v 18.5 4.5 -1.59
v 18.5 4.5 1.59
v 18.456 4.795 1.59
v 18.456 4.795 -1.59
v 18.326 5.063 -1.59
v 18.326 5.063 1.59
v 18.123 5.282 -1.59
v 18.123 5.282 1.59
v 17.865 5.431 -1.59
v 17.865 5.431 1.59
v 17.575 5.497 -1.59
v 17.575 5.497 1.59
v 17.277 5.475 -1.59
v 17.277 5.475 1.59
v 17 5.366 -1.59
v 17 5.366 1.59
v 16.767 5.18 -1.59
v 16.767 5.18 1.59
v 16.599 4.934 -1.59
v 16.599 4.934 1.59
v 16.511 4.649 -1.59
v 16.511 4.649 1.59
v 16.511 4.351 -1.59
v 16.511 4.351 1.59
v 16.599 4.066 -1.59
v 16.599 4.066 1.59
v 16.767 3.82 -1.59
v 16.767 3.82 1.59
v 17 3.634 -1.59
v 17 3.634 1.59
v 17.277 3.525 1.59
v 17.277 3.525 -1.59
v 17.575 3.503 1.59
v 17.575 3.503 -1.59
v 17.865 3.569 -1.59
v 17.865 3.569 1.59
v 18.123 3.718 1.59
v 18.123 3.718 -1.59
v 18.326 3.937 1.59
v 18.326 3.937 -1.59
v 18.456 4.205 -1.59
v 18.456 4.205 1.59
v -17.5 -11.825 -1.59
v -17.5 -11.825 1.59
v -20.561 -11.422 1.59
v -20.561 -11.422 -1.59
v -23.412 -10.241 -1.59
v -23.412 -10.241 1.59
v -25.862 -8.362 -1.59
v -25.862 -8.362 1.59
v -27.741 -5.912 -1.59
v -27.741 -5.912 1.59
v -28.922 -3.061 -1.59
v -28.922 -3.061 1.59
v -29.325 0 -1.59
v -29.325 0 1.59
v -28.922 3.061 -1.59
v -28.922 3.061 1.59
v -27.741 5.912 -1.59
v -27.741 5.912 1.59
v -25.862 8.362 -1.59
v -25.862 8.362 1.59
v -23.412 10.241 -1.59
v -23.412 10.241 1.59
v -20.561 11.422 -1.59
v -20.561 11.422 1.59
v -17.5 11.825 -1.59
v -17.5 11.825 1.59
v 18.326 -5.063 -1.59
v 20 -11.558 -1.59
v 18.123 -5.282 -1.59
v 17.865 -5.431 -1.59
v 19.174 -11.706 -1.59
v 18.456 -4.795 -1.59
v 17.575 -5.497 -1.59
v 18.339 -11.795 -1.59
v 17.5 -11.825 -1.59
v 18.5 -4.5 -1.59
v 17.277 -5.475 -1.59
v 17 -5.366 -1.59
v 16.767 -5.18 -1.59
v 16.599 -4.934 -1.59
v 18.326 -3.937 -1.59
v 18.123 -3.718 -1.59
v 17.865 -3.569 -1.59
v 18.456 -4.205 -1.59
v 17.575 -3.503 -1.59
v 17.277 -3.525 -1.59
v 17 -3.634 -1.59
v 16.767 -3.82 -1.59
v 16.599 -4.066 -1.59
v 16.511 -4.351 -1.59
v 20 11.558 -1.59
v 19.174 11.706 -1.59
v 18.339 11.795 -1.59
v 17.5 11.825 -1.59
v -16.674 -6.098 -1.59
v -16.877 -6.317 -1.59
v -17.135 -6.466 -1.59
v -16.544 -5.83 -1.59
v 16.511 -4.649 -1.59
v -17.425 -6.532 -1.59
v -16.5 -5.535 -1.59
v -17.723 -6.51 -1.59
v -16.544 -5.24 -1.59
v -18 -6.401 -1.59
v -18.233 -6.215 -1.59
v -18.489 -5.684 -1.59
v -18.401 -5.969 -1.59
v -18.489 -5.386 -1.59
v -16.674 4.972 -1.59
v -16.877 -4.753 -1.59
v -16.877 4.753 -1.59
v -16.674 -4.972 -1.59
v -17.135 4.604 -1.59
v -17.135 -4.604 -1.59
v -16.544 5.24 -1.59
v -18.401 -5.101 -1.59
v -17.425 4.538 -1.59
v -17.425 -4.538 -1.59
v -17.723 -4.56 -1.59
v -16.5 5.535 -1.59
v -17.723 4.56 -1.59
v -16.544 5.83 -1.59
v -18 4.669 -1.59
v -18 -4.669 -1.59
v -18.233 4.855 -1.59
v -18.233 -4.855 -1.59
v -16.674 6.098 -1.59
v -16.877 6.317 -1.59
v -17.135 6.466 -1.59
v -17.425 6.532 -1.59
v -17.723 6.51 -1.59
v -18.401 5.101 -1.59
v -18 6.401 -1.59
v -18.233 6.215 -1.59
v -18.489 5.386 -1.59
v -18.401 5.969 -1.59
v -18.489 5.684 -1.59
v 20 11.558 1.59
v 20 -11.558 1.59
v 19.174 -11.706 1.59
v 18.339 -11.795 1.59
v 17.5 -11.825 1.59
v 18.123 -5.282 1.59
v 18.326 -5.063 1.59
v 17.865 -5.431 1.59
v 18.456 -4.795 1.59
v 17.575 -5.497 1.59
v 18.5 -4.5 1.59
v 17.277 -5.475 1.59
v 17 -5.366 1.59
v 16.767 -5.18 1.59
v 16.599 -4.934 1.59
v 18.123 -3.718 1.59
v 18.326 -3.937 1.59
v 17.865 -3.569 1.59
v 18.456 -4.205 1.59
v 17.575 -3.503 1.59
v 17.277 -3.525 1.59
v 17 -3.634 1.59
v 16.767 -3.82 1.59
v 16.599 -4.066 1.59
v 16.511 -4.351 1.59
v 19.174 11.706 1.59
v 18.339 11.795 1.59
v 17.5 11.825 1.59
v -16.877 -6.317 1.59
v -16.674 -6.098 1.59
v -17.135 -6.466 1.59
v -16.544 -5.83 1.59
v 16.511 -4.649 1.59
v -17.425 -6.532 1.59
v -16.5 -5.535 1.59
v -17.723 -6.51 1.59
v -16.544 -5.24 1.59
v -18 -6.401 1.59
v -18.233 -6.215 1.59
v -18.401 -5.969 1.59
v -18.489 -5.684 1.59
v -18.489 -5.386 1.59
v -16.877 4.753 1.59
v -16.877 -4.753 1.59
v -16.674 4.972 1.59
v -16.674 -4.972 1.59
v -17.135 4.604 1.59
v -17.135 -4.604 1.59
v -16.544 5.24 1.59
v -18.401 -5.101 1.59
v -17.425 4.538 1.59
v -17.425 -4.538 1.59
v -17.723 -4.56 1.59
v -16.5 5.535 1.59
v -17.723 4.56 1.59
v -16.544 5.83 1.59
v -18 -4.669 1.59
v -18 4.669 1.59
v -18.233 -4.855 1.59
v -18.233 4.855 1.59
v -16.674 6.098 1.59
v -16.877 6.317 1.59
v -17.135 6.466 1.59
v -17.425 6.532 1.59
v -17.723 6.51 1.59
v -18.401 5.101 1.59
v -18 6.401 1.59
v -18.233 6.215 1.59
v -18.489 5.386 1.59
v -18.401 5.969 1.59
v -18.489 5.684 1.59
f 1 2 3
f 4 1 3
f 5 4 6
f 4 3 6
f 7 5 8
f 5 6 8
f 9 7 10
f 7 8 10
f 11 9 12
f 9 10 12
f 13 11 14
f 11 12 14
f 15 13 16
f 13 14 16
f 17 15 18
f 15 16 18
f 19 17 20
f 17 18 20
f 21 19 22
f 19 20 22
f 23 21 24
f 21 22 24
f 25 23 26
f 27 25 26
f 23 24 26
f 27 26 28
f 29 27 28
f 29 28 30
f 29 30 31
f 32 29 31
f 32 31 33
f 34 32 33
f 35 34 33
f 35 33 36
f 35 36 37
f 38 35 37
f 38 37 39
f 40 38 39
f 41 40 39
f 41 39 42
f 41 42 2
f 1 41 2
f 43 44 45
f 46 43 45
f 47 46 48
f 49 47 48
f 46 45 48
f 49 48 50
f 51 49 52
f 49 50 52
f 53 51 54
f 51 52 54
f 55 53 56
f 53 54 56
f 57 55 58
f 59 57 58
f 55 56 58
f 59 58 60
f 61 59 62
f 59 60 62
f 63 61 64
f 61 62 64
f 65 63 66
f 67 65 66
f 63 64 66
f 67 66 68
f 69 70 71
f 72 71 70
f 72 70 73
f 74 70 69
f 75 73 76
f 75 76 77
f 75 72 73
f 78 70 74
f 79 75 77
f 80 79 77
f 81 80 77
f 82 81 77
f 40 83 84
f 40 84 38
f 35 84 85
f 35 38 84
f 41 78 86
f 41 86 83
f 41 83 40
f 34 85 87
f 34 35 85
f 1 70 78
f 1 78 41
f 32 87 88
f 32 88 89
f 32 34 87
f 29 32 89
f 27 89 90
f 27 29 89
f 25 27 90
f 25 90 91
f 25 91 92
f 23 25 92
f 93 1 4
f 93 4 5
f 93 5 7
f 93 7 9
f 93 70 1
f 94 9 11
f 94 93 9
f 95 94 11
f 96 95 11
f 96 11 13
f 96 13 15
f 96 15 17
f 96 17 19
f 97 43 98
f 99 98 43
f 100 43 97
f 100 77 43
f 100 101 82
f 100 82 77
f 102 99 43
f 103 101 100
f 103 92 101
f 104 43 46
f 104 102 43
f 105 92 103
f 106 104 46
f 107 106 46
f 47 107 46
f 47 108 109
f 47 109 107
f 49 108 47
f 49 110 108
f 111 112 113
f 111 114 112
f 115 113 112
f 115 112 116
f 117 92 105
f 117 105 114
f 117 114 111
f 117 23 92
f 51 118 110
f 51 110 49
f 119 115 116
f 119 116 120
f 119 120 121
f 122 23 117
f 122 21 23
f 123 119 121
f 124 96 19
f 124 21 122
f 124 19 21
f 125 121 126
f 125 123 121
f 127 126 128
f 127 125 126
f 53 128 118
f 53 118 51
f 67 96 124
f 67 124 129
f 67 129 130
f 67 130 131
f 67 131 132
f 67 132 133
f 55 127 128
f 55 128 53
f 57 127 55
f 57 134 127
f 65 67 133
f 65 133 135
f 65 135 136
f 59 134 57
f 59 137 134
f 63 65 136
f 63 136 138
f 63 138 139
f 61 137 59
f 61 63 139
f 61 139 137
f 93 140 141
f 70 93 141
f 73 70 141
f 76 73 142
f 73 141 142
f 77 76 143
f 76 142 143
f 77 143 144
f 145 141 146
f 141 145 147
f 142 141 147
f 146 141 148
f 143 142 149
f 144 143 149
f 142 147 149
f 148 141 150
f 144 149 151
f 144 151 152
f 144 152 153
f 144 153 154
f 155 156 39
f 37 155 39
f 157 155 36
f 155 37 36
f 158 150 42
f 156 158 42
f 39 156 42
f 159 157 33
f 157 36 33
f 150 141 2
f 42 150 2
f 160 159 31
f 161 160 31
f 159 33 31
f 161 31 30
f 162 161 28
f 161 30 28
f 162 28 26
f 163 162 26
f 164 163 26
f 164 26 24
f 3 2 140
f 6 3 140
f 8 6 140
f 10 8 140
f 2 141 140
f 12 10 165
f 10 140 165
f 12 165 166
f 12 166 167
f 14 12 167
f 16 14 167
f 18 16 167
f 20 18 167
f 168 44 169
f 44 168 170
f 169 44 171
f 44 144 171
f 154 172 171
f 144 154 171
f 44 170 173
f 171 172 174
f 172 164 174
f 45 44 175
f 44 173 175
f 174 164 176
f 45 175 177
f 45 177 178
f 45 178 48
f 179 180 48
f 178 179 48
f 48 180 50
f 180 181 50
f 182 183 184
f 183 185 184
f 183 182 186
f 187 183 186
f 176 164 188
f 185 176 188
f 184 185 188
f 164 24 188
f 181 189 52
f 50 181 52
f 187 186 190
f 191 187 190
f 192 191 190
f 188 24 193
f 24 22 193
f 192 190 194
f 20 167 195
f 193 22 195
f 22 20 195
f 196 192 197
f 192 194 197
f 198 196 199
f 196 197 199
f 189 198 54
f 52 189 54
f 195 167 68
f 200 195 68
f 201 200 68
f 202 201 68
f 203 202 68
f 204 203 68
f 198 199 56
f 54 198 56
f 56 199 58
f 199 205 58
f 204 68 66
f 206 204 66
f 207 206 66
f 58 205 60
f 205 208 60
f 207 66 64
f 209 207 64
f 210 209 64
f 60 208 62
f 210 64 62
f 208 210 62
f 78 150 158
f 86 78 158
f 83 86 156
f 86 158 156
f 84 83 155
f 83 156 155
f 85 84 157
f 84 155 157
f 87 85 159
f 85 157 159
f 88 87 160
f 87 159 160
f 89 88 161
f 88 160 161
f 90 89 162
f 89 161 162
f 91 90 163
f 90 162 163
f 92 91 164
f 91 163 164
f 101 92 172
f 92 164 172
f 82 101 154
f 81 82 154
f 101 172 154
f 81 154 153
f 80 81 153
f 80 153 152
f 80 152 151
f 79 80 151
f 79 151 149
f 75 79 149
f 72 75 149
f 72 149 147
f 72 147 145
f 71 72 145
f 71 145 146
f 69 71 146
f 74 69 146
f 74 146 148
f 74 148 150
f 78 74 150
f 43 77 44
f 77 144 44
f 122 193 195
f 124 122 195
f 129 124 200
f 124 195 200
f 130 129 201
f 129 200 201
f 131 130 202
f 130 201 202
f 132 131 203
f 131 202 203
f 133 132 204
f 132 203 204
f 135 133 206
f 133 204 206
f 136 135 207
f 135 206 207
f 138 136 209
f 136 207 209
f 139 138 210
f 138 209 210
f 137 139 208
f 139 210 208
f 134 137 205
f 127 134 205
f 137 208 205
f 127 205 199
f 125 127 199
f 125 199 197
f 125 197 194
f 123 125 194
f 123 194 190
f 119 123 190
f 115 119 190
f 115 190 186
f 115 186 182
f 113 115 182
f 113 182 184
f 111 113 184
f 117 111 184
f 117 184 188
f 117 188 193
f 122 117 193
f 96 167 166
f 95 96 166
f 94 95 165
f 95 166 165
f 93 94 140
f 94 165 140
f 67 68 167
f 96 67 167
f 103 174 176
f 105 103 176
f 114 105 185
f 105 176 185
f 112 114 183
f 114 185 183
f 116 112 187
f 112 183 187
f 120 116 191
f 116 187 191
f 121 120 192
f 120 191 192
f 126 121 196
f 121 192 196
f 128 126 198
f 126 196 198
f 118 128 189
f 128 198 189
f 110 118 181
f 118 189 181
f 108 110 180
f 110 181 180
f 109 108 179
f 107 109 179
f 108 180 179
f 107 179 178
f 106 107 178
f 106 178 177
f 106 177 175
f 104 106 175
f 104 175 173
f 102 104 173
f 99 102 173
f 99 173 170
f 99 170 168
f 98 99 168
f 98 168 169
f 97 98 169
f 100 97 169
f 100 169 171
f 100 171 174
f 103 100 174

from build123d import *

# Parameters (mm, degrees)
BOSS_EXTRUDE1_DEPTH = 1.59
SKETCH4_R           = 1
CUT_EXTRUDE1_DEPTH  = 10
SKETCH5_R           = 1
CUT_EXTRUDE2_DEPTH  = 32.778902593


with BuildPart() as part:
    # Sketch3 → Boss-Extrude1 (new, symmetric)
    with BuildSketch(Plane.XY):
        with BuildLine():
            Line((-17.5, 11.825), (17.5, 11.825))
            ThreePointArc((17.5, 11.825), (29.325, 0), (17.5, -11.825))
            Line((17.5, -11.825), (-17.5, -11.825))
            ThreePointArc((-17.5, -11.825), (-29.325, 0), (-17.5, 11.825))
        make_face()
    extrude(amount=BOSS_EXTRUDE1_DEPTH, both=True)

    # Sketch4 → Cut-Extrude1 (cut)
    with BuildSketch(Plane.XY.offset(1.59)):
        with Locations((-17.5, 5.535)):
            Circle(SKETCH4_R)
        with Locations((-17.5, -5.535)):
            Circle(SKETCH4_R)
    extrude(amount=-CUT_EXTRUDE1_DEPTH, mode=Mode.SUBTRACT)

    # Sketch5 → Cut-Extrude2 (cut, through all)
    with BuildSketch(Plane.XY.offset(1.59)):
        with Locations((17.5, 4.5)):
            Circle(SKETCH5_R)
        with Locations((17.5, -4.5)):
            Circle(SKETCH5_R)
        with BuildLine():
            Line((20, 11.557708467), (20, -11.557708467))
            ThreePointArc((20, -11.557708467), (29.325, 0), (20, 11.557708467))
        make_face()
    extrude(amount=-CUT_EXTRUDE2_DEPTH, mode=Mode.SUBTRACT)


solid = part.part
